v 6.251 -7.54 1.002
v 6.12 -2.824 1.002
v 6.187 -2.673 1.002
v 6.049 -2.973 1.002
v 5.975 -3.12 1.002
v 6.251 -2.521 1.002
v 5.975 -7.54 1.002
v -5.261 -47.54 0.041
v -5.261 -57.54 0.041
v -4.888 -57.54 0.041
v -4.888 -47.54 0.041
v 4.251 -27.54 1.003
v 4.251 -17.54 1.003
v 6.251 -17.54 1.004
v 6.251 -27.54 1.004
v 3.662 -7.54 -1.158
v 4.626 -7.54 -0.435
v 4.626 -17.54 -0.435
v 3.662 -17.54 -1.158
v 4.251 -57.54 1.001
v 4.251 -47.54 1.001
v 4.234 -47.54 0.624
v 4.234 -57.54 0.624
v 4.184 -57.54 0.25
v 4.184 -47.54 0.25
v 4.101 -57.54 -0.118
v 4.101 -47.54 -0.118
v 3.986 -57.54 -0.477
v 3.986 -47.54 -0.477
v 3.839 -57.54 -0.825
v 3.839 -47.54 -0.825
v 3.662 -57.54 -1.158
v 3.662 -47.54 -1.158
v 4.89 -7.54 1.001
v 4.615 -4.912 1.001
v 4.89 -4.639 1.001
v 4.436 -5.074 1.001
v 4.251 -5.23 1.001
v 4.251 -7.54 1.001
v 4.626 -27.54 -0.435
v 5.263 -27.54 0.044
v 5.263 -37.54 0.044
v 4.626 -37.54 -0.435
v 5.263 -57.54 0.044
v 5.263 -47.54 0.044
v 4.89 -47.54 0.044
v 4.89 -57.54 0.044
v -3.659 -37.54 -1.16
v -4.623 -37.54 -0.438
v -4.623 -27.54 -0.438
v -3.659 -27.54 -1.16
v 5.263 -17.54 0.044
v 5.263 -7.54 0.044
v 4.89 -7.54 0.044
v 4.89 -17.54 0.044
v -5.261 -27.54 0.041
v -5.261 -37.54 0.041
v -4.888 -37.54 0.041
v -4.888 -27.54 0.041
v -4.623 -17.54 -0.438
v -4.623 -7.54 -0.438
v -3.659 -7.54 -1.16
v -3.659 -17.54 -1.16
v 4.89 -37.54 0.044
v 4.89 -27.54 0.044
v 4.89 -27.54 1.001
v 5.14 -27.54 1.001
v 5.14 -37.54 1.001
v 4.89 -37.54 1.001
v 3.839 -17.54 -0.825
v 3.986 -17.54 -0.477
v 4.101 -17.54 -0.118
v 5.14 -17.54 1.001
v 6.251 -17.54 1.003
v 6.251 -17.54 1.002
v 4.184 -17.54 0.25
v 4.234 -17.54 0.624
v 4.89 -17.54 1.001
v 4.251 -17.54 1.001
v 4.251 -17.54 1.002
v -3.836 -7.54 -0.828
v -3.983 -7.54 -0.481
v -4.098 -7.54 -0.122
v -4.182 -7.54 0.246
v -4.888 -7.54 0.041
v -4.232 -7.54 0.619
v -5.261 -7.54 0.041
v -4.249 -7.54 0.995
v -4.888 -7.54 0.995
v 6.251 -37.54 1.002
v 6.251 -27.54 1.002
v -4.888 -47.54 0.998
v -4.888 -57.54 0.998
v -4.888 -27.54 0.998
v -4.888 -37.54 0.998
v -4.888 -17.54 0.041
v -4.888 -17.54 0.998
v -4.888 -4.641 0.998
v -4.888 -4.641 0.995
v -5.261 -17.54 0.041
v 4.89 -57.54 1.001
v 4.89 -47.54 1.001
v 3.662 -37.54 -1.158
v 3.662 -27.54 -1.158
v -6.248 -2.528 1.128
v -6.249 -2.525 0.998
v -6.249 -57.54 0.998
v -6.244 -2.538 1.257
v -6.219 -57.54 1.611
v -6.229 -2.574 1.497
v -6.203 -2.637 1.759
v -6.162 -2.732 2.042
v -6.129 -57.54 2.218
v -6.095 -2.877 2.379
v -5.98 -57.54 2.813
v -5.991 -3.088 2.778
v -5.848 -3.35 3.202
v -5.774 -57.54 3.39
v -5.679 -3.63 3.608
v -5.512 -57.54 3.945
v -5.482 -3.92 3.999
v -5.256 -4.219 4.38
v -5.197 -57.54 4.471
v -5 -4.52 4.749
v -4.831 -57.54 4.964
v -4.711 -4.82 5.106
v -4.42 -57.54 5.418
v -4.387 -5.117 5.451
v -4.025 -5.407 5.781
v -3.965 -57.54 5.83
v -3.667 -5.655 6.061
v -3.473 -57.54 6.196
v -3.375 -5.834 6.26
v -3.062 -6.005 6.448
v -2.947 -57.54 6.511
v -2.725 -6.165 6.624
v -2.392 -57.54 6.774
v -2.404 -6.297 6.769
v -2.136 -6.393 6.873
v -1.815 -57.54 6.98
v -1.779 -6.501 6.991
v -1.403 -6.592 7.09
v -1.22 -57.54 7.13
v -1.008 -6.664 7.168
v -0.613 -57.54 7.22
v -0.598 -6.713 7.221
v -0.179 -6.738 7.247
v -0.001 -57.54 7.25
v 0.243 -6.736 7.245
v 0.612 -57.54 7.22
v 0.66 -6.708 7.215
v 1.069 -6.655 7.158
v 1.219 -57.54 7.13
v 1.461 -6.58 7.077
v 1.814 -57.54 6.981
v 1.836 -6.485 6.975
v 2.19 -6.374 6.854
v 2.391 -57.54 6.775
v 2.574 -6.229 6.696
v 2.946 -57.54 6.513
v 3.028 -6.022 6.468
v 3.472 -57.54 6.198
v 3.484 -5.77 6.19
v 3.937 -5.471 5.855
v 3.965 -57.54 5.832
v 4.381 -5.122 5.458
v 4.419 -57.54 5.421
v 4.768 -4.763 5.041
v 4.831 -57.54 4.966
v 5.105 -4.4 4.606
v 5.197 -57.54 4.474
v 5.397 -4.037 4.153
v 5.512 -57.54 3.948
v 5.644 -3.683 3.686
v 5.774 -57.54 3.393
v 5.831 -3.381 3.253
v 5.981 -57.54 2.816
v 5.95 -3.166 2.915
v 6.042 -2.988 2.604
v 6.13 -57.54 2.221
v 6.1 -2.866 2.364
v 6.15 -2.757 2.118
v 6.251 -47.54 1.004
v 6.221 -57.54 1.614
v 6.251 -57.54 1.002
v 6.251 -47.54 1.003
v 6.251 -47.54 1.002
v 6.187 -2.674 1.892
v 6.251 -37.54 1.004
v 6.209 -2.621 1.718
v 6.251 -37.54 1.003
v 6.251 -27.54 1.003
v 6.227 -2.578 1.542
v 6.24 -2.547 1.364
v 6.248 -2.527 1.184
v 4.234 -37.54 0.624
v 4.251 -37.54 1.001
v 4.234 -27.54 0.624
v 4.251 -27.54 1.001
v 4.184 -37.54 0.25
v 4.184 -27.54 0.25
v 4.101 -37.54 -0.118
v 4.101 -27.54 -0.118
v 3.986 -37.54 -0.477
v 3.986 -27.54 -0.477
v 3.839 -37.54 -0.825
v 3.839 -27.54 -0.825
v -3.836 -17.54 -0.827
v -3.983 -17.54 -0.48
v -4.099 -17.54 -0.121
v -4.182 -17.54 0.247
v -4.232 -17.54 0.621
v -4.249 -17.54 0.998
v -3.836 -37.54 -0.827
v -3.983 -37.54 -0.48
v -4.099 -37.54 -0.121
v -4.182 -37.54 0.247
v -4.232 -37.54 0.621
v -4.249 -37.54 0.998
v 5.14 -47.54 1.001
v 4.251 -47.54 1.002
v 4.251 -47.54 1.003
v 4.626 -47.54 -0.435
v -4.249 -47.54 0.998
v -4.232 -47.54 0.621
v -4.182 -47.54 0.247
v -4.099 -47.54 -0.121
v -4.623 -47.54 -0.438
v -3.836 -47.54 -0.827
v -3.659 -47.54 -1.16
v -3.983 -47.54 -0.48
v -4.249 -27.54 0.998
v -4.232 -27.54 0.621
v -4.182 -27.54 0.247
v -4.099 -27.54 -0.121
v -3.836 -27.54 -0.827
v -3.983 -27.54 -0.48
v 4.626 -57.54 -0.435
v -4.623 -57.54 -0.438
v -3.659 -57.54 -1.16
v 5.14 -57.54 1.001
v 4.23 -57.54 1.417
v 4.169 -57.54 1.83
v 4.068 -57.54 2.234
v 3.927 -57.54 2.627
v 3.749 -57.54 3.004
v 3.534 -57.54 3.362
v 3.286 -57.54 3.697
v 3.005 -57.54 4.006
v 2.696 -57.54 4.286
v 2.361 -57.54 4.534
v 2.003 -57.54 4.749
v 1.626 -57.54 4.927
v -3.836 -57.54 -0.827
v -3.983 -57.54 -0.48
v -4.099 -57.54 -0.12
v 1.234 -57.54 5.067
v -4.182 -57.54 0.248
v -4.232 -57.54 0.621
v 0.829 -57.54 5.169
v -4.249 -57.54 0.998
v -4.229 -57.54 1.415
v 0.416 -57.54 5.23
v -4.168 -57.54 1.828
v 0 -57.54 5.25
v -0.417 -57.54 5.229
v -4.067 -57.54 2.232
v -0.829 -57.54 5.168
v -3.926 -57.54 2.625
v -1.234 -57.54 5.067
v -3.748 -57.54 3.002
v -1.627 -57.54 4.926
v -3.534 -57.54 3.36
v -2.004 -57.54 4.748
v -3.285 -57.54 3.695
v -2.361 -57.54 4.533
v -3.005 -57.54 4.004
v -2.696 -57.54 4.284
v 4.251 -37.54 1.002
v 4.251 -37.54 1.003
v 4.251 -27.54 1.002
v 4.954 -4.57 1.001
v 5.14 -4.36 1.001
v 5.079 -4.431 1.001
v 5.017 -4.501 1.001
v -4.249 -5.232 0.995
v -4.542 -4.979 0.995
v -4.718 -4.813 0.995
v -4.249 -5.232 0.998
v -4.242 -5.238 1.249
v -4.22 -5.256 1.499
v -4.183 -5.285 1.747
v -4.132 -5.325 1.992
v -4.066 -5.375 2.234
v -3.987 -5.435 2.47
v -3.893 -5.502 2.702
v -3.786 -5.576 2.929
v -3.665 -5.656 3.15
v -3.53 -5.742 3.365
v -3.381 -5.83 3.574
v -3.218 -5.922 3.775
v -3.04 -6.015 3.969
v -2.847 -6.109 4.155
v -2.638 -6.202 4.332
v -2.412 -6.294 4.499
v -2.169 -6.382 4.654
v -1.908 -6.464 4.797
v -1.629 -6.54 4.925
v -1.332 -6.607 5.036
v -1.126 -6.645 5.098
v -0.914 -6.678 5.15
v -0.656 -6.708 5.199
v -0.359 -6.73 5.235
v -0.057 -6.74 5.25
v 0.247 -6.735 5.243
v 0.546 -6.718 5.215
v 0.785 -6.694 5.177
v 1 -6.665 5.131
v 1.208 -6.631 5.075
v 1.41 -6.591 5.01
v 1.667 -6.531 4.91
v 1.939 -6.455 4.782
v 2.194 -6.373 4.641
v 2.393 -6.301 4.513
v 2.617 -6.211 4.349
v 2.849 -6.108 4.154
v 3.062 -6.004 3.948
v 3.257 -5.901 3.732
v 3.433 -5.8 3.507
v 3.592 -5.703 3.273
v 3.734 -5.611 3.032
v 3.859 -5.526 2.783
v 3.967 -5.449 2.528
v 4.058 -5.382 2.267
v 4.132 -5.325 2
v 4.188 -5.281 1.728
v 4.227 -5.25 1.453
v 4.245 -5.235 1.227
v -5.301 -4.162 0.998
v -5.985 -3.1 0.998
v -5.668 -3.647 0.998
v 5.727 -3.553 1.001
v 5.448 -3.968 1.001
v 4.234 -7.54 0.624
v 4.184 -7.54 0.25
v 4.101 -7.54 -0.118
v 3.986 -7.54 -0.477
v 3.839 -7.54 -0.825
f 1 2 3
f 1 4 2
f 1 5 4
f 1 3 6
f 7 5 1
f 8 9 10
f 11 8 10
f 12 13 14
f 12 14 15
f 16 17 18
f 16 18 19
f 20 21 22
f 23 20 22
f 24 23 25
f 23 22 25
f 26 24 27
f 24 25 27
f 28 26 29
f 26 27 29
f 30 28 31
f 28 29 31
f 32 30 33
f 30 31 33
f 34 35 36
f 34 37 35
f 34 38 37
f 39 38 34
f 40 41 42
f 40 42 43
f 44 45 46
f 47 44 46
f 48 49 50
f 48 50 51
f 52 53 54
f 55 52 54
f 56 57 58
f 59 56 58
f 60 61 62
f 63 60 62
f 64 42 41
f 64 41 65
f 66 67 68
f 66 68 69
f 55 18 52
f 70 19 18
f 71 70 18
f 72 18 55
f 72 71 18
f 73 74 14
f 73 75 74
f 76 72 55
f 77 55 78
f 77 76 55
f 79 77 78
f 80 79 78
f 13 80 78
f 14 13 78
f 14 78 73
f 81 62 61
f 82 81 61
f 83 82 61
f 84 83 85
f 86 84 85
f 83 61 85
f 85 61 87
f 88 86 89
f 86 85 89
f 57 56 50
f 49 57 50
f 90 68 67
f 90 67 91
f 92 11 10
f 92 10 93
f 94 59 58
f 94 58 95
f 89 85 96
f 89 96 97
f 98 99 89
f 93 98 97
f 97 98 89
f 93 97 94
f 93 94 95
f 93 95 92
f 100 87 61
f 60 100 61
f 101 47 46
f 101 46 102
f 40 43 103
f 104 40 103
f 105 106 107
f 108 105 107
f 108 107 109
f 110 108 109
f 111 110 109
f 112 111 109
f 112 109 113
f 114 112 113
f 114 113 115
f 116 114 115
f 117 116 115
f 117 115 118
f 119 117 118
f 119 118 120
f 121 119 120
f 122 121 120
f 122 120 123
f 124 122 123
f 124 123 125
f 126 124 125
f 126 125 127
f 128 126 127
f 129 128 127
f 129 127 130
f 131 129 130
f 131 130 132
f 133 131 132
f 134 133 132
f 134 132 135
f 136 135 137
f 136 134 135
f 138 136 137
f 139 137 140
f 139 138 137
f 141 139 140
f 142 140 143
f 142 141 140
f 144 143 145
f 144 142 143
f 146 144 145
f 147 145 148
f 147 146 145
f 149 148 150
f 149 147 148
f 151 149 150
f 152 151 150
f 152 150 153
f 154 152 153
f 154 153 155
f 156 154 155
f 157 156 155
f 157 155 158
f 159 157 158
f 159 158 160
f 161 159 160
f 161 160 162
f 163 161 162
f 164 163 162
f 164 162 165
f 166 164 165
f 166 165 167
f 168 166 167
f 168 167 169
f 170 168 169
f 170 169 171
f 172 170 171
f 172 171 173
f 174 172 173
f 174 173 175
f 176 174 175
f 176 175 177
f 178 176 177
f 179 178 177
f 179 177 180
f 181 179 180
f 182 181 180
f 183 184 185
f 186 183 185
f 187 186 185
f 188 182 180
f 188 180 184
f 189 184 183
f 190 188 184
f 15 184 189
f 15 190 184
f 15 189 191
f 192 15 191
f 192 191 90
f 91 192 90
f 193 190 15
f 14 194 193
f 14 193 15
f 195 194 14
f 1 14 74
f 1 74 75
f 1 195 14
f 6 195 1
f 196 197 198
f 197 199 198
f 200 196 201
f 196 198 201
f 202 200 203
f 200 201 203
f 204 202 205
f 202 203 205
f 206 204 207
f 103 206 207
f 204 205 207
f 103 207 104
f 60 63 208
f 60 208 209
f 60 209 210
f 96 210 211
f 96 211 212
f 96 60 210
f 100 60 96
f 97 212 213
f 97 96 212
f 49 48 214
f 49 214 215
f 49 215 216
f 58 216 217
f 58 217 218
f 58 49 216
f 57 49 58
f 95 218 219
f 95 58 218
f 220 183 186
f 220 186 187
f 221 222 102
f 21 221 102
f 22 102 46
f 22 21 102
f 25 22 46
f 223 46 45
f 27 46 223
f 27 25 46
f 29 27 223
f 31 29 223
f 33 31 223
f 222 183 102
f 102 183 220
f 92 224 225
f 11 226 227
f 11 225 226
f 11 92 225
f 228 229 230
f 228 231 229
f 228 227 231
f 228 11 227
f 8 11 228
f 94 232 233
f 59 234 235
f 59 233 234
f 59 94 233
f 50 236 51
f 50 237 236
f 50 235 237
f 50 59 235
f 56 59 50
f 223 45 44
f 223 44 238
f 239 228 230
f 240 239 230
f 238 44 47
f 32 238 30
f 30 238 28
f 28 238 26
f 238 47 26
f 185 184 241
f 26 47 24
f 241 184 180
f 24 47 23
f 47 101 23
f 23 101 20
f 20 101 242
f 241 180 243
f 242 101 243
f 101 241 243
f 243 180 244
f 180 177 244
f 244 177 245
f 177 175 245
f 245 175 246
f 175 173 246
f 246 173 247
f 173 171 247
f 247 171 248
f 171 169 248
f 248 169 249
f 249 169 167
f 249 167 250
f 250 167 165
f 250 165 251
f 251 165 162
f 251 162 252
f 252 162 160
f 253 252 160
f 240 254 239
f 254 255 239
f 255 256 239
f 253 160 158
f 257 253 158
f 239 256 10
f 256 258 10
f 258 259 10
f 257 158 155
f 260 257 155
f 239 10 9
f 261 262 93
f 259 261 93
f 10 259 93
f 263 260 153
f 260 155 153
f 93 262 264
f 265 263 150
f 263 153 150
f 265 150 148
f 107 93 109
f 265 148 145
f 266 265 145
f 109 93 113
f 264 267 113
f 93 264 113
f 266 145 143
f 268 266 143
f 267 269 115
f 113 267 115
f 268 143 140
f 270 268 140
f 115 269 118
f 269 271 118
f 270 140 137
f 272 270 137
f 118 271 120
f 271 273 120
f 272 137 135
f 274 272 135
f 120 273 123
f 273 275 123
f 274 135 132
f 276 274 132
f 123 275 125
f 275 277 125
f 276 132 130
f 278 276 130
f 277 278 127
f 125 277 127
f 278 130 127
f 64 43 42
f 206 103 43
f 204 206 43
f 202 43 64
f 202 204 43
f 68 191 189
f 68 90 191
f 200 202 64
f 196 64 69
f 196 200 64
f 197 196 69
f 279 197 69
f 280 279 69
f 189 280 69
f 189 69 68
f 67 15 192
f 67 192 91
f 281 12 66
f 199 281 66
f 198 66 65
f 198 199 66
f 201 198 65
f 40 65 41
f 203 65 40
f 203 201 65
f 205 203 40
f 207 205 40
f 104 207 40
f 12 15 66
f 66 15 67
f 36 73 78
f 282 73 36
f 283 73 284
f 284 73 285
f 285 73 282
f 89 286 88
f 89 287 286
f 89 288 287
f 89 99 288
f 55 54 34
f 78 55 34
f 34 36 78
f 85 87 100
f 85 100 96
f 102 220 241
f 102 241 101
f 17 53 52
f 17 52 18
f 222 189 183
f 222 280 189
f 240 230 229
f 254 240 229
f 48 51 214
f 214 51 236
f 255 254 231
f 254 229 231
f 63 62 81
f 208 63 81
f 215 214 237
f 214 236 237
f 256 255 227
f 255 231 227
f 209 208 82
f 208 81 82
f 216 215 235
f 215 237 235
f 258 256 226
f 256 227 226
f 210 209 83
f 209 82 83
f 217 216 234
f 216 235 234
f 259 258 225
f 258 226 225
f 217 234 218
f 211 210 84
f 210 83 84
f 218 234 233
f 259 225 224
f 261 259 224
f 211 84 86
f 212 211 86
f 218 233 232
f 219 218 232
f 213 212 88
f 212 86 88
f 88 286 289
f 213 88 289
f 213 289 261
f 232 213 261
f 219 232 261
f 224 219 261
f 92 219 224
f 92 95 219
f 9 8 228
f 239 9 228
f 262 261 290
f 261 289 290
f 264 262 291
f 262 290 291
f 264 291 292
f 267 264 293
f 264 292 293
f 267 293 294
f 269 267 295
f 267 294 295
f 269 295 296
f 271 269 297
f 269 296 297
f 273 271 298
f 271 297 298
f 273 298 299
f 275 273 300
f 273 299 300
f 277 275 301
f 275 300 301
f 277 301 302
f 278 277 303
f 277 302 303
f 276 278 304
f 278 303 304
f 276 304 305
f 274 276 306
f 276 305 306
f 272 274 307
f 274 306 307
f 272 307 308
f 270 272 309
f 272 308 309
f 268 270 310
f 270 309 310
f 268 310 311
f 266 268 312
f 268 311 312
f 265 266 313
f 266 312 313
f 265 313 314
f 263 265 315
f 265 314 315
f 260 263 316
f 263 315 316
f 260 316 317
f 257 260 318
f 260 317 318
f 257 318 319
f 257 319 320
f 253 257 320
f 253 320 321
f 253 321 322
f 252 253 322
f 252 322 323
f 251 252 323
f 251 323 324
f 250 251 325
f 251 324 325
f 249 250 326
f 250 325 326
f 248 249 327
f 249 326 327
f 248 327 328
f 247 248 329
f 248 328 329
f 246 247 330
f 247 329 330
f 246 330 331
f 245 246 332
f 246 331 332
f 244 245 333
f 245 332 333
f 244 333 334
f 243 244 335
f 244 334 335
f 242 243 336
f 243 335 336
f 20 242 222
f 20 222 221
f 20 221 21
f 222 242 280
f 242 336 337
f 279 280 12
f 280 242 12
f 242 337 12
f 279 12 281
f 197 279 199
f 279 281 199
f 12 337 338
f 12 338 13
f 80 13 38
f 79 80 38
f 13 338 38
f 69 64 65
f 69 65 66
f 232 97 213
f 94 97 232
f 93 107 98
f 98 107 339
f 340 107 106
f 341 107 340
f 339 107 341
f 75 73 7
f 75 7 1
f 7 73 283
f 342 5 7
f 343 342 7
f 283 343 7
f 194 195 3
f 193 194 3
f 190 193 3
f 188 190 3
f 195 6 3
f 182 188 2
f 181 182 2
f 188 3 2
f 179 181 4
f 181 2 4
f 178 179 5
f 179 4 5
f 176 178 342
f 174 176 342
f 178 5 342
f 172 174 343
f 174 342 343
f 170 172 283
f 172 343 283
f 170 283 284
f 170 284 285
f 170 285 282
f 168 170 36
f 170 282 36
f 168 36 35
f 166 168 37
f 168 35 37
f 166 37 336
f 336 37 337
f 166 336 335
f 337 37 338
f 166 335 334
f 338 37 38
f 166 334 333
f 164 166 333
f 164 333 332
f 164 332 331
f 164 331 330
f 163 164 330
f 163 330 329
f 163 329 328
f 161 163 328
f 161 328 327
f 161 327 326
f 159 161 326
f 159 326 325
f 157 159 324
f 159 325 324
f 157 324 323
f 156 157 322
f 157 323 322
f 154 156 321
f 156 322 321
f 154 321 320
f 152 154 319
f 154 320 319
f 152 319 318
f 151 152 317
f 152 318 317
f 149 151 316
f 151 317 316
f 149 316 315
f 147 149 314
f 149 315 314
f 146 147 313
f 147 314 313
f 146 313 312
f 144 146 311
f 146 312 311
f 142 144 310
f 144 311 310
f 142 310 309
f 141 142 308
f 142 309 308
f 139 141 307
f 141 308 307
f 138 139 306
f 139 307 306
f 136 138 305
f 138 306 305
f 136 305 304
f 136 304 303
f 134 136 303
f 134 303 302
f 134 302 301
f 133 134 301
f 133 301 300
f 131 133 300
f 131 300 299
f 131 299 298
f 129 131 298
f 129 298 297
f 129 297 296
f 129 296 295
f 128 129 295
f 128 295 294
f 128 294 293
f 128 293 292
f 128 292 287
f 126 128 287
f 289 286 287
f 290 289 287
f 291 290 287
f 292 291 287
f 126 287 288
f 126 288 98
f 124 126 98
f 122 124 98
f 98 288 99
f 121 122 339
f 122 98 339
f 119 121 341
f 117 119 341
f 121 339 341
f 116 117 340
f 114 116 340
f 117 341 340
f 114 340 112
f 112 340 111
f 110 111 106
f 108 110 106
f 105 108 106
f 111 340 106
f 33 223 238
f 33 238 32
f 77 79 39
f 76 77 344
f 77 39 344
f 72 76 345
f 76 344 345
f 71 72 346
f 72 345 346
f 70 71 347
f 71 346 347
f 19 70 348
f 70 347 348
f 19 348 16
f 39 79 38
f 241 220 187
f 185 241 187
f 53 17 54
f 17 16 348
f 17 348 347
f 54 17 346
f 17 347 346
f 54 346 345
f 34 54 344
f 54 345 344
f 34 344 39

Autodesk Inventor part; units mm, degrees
ref_plane "YZ Plane" through (0, 0, 0) normal (1, 0, 0) x (0, 1, 0)
ref_plane "Work Plane2" through (0.0017, -6.74, -2) normal (0, 1, 0) x (-1, 0, 0)
sketch "Sketch1" plane through (0.0017, -6.74, -2) normal (0, 1, 0) x (-1, 0, 0)
  line L0 (-2.7483, 0) -> (0, 0) construction
  line L1 (0, 0) -> (0.0017, 6)
  line L2 (1.7517, 6) -> (-1.7483, 6) construction
  arc A0 (-3.9294, 1.3826) -> (-4.2492, 3) centre (0.0008, 3) ccw construction
  arc A1 (-3.413, 0.4685) -> (3.4132, 0.4666) centre (0.0008, 3) ccw construction
  line L3 (5.1396, 2.9983) -> (6.2508, 2.9983)
  arc A2 (-6.2492, 3.0017) -> (6.2508, 2.9983) centre (0.0008, 3) ccw construction
  line L4 (5.7129, 2.1908) -> (5.1396, 2.1908) construction
  line L5 (5.1396, 2.1908) -> (5.1396, 2.9983) construction
  line L6 (-5.138, 3.0011) -> (-6.2492, 3.0017)
  line L7 (-5.7117, 2.194) -> (-5.1384, 2.1937) construction
  line L8 (-5.1384, 2.1937) -> (-5.138, 3.0011) construction
  line L9 (5.7129, 2.1908) -> (3.4132, 0.4666) construction
  line L10 (-5.7117, 2.194) -> (-3.413, 0.4685) construction
  line L11 (5.1396, 2.5258) -> (4.8896, 2.5258) construction
  line L12 (5.1396, 2.1908) -> (5.1396, 2.0408) construction
  line L13 (4.7148, 1.4425) -> (4.6248, 1.5625) construction
  line L14 (5.2628, 2.0408) -> (4.6248, 1.5625)
  line L15 (5.2628, 2.0408) -> (4.8896, 2.0408)
  line L16 (5.1396, 2.9983) -> (4.8896, 2.9983)
  line L17 (4.8896, 2.0408) -> (4.8896, 2.9983)
  line L18 (4.6248, 1.5625) -> (3.6609, 0.8398)
  arc A3 (3.6609, 0.8398) -> (4.2508, 2.9983) centre (0.0008, 3) ccw
  line L19 (-5.2617, 2.0437) -> (-4.624, 1.5651)
  line L20 (-5.2617, 2.0437) -> (-4.8885, 2.0435)
  line L21 (-5.138, 3.0011) -> (-4.888, 3.001)
  line L22 (-4.8885, 2.0435) -> (-4.888, 3.001)
  line L23 (-4.624, 1.5651) -> (-3.6604, 0.8418)
  arc A4 (-4.2492, 3.0006) -> (-3.6604, 0.8418) centre (0.0008, 3) ccw
  arc A5 (4.2508, 2.9983) -> (-4.2492, 3.0006) centre (0.0008, 3) ccw
  arc A6 (-6.2492, 3.0017) -> (6.2508, 2.9983) centre (0.0008, 3) ccw construction
  arc A7 (6.2508, 2.9983) -> (-6.2492, 3.0017) centre (0.0008, 3) ccw
  point P0 (0.0017, 2)
  point P1 (3.9302, 1.3805)
  dimension "d0" = 8.5
  dimension "d3" = 12.5
extrude "Extrusion4" add sketch "Sketch1" against normal blind 50.8
ref_plane "Work Plane3" through (0, 0, -8) normal (0, 0, -1) x (-1, 0.0001, 0)
sketch "Sketch2" plane through (0, 0, -8) normal (0, 0, -1) x (-1, 0.0001, 0)
  circle A0 centre (0, 0) radius 6.74
extrude "Extrusion5" add sketch "Sketch1" along normal blind 5
extrude "Extrusion6" cut sketch "Sketch2" against normal blind 100
sketch "Sketch3" plane through (4.8902, -57.54, 0.0435) normal (1, 0, 0.0006) x (0.0006, 0, -1)
  line L0 (-0.0029, 0) -> (1.199, 0) projected
  line L1 (1.199, 0) -> (1.2011, 10) construction
  line L2 (1.2011, 51.8817) -> (1.2011, 0) projected
  line L3 (1.2011, 10) -> (1.2011, 20)
  line L4 (1.2011, 20) -> (1.2011, 30) construction
  line L5 (1.2011, 30) -> (1.2011, 40)
  line L6 (1.2011, 40) -> (1.2011, 50) construction
  line L7 (-0.9574, 55.0191) -> (-0.9574, 0) projected
  line L8 (1.2011, 50) -> (-0.9574, 50)
  line L9 (-0.9574, 50) -> (-0.9574, 55.0191)
  line L10 (-0.9574, 55.0191) -> (1.2011, 55.0191)
  line L11 (1.2011, 55.0191) -> (1.2011, 50)
  line L12 (-0.9601, 52.8994) -> (-0.9601, 0) projected
  line L13 (1.2011, 40) -> (-0.9601, 40)
  line L14 (-0.9601, 40) -> (-0.9601, 30)
  line L15 (-0.9601, 30) -> (1.2011, 30)
  line L16 (1.2011, 30) -> (1.2011, 40)
  line L17 (1.2011, 20) -> (-0.9601, 20)
  line L18 (-0.9601, 20) -> (-0.9601, 10)
  line L19 (-0.9601, 10) -> (1.2011, 10)
  line L20 (1.2011, 10) -> (1.2011, 20)
  point P0 (0.0408, 57.54)
  dimension "d27" = 10
  dimension "d28" = 10
  dimension "d29" = 10
  dimension "d30" = 10
  dimension "d31" = 10
extrude "Extrusion7" cut sketch "Sketch3" along normal mid plane 100 contours L2 L8 L7 L10 L11 | L2 L15 L7 L13 | L7 L15 L12 L13 | L2 L19 L7 L17 | L7 L19 L12 L17
properties part number "drone motor arm top"
